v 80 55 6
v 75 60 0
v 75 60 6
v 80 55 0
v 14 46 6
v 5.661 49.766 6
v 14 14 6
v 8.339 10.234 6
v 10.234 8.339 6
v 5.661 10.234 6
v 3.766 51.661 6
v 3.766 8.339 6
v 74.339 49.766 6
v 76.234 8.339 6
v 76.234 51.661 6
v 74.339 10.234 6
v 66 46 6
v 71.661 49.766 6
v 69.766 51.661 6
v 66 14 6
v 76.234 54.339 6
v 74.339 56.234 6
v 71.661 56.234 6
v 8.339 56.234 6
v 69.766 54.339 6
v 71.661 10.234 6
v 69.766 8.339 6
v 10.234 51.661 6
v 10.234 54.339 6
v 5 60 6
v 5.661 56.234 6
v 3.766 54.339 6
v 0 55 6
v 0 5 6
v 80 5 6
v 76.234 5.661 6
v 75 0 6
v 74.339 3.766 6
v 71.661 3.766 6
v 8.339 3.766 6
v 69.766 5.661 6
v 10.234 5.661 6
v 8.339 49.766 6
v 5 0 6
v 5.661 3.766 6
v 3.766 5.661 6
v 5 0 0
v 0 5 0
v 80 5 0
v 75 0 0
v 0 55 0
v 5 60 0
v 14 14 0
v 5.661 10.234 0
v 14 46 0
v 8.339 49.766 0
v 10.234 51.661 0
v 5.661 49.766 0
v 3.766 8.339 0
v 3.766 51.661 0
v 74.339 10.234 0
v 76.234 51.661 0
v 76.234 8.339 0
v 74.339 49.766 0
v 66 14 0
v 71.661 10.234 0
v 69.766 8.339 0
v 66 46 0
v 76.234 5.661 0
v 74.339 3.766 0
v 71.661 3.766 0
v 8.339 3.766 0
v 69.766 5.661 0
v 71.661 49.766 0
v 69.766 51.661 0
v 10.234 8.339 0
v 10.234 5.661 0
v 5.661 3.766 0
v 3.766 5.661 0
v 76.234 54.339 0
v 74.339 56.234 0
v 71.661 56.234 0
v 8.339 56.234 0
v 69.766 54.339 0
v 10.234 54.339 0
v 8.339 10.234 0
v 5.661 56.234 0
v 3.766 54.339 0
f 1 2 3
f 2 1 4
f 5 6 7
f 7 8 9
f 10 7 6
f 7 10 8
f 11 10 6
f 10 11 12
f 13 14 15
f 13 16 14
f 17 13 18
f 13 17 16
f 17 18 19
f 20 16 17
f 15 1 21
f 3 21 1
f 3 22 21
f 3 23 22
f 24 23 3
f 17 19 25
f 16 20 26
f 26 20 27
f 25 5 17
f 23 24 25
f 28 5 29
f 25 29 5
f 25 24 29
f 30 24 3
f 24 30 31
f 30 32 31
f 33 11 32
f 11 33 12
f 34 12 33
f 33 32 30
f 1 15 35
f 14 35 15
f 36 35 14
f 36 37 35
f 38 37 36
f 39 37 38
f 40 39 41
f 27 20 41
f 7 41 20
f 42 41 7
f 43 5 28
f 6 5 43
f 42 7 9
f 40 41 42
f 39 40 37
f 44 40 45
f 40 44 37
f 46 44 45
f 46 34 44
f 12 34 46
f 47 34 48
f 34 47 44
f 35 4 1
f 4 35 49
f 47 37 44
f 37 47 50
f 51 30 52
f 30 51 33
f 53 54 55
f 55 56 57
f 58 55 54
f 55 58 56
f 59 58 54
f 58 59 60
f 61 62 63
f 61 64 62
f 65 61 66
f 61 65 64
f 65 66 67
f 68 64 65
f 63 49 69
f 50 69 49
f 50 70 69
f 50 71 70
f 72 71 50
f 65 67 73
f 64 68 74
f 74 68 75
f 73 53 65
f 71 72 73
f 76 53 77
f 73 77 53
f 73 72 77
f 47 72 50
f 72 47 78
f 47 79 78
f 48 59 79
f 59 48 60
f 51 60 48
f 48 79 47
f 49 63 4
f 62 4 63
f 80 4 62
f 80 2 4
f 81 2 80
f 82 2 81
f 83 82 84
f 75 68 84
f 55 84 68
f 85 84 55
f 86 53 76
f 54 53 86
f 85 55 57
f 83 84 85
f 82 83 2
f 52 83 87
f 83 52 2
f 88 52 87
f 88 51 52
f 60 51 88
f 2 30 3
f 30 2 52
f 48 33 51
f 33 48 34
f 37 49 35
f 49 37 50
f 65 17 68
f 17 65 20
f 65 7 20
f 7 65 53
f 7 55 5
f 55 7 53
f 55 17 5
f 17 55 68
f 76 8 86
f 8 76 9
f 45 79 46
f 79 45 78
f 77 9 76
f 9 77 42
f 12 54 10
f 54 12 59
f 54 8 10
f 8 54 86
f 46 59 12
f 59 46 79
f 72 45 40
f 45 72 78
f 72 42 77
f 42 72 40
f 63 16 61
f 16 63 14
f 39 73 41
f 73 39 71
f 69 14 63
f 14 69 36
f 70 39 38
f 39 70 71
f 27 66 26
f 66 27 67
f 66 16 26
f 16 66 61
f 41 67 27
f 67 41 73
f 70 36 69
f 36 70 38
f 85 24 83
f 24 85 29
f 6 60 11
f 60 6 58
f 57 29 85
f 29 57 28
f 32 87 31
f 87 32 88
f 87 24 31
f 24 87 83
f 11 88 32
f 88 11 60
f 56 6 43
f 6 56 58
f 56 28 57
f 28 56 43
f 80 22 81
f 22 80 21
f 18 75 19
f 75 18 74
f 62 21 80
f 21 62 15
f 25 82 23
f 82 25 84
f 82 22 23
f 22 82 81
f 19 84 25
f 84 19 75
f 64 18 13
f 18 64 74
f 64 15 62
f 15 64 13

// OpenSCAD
$fn = 32;

// ----------------------------------------------------------------------
// Frame plate: 80 x 60 frame, 14 mm rails
// ----------------------------------------------------------------------

// --- parameters (mm) ---
plate_l = 80;             // plate length, X
plate_w = 60;             // plate width, Y
plate_t = 6;              // plate thickness, Z (extrusion height)
corner_c = 5;             // corner chamfer
frame_bar = 14;           // frame rail width
bolt_r = 3.5;             // corner bolt window radius
bolt_inset = 7;           // bolt centre inset from the edges
fit_tol = 0.1;            // declared fit tolerance (prompt contract)
free_tol = 0.3;           // declared free tolerance (prompt contract)

win_l = plate_l - 2 * frame_bar;  // window length
win_w = plate_w - 2 * frame_bar;  // window width
bolt_d = 2 * bolt_r;  // corner hole diameter

profile = [[5, 0], [75, 0], [80, 5], [80, 55], [75, 60], [5, 60], [0, 55], [0, 5]];  // primary outline, 8 points, counter clockwise
void_1 = [[14, 14], [66, 14], [66, 46], [14, 46]];  // the window, 4 points
void_2 = [[10.234, 8.339], [8.339, 10.234], [5.661, 10.234], [3.766, 8.339], [3.766, 5.661], [5.661, 3.766], [8.339, 3.766], [10.234, 5.661]];  // corner bolt window, 8 points
void_3 = [[76.234, 8.339], [74.339, 10.234], [71.661, 10.234], [69.766, 8.339], [69.766, 5.661], [71.661, 3.766], [74.339, 3.766], [76.234, 5.661]];  // corner bolt window, 8 points
void_4 = [[10.234, 54.339], [8.339, 56.234], [5.661, 56.234], [3.766, 54.339], [3.766, 51.661], [5.661, 49.766], [8.339, 49.766], [10.234, 51.661]];  // corner bolt window, 8 points
void_5 = [[76.234, 54.339], [74.339, 56.234], [71.661, 56.234], [69.766, 54.339], [69.766, 51.661], [71.661, 49.766], [74.339, 49.766], [76.234, 51.661]];  // corner bolt window, 8 points

// --- the one profile operation ---
difference() {
  linear_extrude(height = plate_t) polygon(points = profile);
  translate([0, 0, -1])
    linear_extrude(height = plate_t + 2) polygon(points = void_1);
  translate([0, 0, -1])
    linear_extrude(height = plate_t + 2) polygon(points = void_2);
  translate([0, 0, -1])
    linear_extrude(height = plate_t + 2) polygon(points = void_3);
  translate([0, 0, -1])
    linear_extrude(height = plate_t + 2) polygon(points = void_4);
  translate([0, 0, -1])
    linear_extrude(height = plate_t + 2) polygon(points = void_5);
}
